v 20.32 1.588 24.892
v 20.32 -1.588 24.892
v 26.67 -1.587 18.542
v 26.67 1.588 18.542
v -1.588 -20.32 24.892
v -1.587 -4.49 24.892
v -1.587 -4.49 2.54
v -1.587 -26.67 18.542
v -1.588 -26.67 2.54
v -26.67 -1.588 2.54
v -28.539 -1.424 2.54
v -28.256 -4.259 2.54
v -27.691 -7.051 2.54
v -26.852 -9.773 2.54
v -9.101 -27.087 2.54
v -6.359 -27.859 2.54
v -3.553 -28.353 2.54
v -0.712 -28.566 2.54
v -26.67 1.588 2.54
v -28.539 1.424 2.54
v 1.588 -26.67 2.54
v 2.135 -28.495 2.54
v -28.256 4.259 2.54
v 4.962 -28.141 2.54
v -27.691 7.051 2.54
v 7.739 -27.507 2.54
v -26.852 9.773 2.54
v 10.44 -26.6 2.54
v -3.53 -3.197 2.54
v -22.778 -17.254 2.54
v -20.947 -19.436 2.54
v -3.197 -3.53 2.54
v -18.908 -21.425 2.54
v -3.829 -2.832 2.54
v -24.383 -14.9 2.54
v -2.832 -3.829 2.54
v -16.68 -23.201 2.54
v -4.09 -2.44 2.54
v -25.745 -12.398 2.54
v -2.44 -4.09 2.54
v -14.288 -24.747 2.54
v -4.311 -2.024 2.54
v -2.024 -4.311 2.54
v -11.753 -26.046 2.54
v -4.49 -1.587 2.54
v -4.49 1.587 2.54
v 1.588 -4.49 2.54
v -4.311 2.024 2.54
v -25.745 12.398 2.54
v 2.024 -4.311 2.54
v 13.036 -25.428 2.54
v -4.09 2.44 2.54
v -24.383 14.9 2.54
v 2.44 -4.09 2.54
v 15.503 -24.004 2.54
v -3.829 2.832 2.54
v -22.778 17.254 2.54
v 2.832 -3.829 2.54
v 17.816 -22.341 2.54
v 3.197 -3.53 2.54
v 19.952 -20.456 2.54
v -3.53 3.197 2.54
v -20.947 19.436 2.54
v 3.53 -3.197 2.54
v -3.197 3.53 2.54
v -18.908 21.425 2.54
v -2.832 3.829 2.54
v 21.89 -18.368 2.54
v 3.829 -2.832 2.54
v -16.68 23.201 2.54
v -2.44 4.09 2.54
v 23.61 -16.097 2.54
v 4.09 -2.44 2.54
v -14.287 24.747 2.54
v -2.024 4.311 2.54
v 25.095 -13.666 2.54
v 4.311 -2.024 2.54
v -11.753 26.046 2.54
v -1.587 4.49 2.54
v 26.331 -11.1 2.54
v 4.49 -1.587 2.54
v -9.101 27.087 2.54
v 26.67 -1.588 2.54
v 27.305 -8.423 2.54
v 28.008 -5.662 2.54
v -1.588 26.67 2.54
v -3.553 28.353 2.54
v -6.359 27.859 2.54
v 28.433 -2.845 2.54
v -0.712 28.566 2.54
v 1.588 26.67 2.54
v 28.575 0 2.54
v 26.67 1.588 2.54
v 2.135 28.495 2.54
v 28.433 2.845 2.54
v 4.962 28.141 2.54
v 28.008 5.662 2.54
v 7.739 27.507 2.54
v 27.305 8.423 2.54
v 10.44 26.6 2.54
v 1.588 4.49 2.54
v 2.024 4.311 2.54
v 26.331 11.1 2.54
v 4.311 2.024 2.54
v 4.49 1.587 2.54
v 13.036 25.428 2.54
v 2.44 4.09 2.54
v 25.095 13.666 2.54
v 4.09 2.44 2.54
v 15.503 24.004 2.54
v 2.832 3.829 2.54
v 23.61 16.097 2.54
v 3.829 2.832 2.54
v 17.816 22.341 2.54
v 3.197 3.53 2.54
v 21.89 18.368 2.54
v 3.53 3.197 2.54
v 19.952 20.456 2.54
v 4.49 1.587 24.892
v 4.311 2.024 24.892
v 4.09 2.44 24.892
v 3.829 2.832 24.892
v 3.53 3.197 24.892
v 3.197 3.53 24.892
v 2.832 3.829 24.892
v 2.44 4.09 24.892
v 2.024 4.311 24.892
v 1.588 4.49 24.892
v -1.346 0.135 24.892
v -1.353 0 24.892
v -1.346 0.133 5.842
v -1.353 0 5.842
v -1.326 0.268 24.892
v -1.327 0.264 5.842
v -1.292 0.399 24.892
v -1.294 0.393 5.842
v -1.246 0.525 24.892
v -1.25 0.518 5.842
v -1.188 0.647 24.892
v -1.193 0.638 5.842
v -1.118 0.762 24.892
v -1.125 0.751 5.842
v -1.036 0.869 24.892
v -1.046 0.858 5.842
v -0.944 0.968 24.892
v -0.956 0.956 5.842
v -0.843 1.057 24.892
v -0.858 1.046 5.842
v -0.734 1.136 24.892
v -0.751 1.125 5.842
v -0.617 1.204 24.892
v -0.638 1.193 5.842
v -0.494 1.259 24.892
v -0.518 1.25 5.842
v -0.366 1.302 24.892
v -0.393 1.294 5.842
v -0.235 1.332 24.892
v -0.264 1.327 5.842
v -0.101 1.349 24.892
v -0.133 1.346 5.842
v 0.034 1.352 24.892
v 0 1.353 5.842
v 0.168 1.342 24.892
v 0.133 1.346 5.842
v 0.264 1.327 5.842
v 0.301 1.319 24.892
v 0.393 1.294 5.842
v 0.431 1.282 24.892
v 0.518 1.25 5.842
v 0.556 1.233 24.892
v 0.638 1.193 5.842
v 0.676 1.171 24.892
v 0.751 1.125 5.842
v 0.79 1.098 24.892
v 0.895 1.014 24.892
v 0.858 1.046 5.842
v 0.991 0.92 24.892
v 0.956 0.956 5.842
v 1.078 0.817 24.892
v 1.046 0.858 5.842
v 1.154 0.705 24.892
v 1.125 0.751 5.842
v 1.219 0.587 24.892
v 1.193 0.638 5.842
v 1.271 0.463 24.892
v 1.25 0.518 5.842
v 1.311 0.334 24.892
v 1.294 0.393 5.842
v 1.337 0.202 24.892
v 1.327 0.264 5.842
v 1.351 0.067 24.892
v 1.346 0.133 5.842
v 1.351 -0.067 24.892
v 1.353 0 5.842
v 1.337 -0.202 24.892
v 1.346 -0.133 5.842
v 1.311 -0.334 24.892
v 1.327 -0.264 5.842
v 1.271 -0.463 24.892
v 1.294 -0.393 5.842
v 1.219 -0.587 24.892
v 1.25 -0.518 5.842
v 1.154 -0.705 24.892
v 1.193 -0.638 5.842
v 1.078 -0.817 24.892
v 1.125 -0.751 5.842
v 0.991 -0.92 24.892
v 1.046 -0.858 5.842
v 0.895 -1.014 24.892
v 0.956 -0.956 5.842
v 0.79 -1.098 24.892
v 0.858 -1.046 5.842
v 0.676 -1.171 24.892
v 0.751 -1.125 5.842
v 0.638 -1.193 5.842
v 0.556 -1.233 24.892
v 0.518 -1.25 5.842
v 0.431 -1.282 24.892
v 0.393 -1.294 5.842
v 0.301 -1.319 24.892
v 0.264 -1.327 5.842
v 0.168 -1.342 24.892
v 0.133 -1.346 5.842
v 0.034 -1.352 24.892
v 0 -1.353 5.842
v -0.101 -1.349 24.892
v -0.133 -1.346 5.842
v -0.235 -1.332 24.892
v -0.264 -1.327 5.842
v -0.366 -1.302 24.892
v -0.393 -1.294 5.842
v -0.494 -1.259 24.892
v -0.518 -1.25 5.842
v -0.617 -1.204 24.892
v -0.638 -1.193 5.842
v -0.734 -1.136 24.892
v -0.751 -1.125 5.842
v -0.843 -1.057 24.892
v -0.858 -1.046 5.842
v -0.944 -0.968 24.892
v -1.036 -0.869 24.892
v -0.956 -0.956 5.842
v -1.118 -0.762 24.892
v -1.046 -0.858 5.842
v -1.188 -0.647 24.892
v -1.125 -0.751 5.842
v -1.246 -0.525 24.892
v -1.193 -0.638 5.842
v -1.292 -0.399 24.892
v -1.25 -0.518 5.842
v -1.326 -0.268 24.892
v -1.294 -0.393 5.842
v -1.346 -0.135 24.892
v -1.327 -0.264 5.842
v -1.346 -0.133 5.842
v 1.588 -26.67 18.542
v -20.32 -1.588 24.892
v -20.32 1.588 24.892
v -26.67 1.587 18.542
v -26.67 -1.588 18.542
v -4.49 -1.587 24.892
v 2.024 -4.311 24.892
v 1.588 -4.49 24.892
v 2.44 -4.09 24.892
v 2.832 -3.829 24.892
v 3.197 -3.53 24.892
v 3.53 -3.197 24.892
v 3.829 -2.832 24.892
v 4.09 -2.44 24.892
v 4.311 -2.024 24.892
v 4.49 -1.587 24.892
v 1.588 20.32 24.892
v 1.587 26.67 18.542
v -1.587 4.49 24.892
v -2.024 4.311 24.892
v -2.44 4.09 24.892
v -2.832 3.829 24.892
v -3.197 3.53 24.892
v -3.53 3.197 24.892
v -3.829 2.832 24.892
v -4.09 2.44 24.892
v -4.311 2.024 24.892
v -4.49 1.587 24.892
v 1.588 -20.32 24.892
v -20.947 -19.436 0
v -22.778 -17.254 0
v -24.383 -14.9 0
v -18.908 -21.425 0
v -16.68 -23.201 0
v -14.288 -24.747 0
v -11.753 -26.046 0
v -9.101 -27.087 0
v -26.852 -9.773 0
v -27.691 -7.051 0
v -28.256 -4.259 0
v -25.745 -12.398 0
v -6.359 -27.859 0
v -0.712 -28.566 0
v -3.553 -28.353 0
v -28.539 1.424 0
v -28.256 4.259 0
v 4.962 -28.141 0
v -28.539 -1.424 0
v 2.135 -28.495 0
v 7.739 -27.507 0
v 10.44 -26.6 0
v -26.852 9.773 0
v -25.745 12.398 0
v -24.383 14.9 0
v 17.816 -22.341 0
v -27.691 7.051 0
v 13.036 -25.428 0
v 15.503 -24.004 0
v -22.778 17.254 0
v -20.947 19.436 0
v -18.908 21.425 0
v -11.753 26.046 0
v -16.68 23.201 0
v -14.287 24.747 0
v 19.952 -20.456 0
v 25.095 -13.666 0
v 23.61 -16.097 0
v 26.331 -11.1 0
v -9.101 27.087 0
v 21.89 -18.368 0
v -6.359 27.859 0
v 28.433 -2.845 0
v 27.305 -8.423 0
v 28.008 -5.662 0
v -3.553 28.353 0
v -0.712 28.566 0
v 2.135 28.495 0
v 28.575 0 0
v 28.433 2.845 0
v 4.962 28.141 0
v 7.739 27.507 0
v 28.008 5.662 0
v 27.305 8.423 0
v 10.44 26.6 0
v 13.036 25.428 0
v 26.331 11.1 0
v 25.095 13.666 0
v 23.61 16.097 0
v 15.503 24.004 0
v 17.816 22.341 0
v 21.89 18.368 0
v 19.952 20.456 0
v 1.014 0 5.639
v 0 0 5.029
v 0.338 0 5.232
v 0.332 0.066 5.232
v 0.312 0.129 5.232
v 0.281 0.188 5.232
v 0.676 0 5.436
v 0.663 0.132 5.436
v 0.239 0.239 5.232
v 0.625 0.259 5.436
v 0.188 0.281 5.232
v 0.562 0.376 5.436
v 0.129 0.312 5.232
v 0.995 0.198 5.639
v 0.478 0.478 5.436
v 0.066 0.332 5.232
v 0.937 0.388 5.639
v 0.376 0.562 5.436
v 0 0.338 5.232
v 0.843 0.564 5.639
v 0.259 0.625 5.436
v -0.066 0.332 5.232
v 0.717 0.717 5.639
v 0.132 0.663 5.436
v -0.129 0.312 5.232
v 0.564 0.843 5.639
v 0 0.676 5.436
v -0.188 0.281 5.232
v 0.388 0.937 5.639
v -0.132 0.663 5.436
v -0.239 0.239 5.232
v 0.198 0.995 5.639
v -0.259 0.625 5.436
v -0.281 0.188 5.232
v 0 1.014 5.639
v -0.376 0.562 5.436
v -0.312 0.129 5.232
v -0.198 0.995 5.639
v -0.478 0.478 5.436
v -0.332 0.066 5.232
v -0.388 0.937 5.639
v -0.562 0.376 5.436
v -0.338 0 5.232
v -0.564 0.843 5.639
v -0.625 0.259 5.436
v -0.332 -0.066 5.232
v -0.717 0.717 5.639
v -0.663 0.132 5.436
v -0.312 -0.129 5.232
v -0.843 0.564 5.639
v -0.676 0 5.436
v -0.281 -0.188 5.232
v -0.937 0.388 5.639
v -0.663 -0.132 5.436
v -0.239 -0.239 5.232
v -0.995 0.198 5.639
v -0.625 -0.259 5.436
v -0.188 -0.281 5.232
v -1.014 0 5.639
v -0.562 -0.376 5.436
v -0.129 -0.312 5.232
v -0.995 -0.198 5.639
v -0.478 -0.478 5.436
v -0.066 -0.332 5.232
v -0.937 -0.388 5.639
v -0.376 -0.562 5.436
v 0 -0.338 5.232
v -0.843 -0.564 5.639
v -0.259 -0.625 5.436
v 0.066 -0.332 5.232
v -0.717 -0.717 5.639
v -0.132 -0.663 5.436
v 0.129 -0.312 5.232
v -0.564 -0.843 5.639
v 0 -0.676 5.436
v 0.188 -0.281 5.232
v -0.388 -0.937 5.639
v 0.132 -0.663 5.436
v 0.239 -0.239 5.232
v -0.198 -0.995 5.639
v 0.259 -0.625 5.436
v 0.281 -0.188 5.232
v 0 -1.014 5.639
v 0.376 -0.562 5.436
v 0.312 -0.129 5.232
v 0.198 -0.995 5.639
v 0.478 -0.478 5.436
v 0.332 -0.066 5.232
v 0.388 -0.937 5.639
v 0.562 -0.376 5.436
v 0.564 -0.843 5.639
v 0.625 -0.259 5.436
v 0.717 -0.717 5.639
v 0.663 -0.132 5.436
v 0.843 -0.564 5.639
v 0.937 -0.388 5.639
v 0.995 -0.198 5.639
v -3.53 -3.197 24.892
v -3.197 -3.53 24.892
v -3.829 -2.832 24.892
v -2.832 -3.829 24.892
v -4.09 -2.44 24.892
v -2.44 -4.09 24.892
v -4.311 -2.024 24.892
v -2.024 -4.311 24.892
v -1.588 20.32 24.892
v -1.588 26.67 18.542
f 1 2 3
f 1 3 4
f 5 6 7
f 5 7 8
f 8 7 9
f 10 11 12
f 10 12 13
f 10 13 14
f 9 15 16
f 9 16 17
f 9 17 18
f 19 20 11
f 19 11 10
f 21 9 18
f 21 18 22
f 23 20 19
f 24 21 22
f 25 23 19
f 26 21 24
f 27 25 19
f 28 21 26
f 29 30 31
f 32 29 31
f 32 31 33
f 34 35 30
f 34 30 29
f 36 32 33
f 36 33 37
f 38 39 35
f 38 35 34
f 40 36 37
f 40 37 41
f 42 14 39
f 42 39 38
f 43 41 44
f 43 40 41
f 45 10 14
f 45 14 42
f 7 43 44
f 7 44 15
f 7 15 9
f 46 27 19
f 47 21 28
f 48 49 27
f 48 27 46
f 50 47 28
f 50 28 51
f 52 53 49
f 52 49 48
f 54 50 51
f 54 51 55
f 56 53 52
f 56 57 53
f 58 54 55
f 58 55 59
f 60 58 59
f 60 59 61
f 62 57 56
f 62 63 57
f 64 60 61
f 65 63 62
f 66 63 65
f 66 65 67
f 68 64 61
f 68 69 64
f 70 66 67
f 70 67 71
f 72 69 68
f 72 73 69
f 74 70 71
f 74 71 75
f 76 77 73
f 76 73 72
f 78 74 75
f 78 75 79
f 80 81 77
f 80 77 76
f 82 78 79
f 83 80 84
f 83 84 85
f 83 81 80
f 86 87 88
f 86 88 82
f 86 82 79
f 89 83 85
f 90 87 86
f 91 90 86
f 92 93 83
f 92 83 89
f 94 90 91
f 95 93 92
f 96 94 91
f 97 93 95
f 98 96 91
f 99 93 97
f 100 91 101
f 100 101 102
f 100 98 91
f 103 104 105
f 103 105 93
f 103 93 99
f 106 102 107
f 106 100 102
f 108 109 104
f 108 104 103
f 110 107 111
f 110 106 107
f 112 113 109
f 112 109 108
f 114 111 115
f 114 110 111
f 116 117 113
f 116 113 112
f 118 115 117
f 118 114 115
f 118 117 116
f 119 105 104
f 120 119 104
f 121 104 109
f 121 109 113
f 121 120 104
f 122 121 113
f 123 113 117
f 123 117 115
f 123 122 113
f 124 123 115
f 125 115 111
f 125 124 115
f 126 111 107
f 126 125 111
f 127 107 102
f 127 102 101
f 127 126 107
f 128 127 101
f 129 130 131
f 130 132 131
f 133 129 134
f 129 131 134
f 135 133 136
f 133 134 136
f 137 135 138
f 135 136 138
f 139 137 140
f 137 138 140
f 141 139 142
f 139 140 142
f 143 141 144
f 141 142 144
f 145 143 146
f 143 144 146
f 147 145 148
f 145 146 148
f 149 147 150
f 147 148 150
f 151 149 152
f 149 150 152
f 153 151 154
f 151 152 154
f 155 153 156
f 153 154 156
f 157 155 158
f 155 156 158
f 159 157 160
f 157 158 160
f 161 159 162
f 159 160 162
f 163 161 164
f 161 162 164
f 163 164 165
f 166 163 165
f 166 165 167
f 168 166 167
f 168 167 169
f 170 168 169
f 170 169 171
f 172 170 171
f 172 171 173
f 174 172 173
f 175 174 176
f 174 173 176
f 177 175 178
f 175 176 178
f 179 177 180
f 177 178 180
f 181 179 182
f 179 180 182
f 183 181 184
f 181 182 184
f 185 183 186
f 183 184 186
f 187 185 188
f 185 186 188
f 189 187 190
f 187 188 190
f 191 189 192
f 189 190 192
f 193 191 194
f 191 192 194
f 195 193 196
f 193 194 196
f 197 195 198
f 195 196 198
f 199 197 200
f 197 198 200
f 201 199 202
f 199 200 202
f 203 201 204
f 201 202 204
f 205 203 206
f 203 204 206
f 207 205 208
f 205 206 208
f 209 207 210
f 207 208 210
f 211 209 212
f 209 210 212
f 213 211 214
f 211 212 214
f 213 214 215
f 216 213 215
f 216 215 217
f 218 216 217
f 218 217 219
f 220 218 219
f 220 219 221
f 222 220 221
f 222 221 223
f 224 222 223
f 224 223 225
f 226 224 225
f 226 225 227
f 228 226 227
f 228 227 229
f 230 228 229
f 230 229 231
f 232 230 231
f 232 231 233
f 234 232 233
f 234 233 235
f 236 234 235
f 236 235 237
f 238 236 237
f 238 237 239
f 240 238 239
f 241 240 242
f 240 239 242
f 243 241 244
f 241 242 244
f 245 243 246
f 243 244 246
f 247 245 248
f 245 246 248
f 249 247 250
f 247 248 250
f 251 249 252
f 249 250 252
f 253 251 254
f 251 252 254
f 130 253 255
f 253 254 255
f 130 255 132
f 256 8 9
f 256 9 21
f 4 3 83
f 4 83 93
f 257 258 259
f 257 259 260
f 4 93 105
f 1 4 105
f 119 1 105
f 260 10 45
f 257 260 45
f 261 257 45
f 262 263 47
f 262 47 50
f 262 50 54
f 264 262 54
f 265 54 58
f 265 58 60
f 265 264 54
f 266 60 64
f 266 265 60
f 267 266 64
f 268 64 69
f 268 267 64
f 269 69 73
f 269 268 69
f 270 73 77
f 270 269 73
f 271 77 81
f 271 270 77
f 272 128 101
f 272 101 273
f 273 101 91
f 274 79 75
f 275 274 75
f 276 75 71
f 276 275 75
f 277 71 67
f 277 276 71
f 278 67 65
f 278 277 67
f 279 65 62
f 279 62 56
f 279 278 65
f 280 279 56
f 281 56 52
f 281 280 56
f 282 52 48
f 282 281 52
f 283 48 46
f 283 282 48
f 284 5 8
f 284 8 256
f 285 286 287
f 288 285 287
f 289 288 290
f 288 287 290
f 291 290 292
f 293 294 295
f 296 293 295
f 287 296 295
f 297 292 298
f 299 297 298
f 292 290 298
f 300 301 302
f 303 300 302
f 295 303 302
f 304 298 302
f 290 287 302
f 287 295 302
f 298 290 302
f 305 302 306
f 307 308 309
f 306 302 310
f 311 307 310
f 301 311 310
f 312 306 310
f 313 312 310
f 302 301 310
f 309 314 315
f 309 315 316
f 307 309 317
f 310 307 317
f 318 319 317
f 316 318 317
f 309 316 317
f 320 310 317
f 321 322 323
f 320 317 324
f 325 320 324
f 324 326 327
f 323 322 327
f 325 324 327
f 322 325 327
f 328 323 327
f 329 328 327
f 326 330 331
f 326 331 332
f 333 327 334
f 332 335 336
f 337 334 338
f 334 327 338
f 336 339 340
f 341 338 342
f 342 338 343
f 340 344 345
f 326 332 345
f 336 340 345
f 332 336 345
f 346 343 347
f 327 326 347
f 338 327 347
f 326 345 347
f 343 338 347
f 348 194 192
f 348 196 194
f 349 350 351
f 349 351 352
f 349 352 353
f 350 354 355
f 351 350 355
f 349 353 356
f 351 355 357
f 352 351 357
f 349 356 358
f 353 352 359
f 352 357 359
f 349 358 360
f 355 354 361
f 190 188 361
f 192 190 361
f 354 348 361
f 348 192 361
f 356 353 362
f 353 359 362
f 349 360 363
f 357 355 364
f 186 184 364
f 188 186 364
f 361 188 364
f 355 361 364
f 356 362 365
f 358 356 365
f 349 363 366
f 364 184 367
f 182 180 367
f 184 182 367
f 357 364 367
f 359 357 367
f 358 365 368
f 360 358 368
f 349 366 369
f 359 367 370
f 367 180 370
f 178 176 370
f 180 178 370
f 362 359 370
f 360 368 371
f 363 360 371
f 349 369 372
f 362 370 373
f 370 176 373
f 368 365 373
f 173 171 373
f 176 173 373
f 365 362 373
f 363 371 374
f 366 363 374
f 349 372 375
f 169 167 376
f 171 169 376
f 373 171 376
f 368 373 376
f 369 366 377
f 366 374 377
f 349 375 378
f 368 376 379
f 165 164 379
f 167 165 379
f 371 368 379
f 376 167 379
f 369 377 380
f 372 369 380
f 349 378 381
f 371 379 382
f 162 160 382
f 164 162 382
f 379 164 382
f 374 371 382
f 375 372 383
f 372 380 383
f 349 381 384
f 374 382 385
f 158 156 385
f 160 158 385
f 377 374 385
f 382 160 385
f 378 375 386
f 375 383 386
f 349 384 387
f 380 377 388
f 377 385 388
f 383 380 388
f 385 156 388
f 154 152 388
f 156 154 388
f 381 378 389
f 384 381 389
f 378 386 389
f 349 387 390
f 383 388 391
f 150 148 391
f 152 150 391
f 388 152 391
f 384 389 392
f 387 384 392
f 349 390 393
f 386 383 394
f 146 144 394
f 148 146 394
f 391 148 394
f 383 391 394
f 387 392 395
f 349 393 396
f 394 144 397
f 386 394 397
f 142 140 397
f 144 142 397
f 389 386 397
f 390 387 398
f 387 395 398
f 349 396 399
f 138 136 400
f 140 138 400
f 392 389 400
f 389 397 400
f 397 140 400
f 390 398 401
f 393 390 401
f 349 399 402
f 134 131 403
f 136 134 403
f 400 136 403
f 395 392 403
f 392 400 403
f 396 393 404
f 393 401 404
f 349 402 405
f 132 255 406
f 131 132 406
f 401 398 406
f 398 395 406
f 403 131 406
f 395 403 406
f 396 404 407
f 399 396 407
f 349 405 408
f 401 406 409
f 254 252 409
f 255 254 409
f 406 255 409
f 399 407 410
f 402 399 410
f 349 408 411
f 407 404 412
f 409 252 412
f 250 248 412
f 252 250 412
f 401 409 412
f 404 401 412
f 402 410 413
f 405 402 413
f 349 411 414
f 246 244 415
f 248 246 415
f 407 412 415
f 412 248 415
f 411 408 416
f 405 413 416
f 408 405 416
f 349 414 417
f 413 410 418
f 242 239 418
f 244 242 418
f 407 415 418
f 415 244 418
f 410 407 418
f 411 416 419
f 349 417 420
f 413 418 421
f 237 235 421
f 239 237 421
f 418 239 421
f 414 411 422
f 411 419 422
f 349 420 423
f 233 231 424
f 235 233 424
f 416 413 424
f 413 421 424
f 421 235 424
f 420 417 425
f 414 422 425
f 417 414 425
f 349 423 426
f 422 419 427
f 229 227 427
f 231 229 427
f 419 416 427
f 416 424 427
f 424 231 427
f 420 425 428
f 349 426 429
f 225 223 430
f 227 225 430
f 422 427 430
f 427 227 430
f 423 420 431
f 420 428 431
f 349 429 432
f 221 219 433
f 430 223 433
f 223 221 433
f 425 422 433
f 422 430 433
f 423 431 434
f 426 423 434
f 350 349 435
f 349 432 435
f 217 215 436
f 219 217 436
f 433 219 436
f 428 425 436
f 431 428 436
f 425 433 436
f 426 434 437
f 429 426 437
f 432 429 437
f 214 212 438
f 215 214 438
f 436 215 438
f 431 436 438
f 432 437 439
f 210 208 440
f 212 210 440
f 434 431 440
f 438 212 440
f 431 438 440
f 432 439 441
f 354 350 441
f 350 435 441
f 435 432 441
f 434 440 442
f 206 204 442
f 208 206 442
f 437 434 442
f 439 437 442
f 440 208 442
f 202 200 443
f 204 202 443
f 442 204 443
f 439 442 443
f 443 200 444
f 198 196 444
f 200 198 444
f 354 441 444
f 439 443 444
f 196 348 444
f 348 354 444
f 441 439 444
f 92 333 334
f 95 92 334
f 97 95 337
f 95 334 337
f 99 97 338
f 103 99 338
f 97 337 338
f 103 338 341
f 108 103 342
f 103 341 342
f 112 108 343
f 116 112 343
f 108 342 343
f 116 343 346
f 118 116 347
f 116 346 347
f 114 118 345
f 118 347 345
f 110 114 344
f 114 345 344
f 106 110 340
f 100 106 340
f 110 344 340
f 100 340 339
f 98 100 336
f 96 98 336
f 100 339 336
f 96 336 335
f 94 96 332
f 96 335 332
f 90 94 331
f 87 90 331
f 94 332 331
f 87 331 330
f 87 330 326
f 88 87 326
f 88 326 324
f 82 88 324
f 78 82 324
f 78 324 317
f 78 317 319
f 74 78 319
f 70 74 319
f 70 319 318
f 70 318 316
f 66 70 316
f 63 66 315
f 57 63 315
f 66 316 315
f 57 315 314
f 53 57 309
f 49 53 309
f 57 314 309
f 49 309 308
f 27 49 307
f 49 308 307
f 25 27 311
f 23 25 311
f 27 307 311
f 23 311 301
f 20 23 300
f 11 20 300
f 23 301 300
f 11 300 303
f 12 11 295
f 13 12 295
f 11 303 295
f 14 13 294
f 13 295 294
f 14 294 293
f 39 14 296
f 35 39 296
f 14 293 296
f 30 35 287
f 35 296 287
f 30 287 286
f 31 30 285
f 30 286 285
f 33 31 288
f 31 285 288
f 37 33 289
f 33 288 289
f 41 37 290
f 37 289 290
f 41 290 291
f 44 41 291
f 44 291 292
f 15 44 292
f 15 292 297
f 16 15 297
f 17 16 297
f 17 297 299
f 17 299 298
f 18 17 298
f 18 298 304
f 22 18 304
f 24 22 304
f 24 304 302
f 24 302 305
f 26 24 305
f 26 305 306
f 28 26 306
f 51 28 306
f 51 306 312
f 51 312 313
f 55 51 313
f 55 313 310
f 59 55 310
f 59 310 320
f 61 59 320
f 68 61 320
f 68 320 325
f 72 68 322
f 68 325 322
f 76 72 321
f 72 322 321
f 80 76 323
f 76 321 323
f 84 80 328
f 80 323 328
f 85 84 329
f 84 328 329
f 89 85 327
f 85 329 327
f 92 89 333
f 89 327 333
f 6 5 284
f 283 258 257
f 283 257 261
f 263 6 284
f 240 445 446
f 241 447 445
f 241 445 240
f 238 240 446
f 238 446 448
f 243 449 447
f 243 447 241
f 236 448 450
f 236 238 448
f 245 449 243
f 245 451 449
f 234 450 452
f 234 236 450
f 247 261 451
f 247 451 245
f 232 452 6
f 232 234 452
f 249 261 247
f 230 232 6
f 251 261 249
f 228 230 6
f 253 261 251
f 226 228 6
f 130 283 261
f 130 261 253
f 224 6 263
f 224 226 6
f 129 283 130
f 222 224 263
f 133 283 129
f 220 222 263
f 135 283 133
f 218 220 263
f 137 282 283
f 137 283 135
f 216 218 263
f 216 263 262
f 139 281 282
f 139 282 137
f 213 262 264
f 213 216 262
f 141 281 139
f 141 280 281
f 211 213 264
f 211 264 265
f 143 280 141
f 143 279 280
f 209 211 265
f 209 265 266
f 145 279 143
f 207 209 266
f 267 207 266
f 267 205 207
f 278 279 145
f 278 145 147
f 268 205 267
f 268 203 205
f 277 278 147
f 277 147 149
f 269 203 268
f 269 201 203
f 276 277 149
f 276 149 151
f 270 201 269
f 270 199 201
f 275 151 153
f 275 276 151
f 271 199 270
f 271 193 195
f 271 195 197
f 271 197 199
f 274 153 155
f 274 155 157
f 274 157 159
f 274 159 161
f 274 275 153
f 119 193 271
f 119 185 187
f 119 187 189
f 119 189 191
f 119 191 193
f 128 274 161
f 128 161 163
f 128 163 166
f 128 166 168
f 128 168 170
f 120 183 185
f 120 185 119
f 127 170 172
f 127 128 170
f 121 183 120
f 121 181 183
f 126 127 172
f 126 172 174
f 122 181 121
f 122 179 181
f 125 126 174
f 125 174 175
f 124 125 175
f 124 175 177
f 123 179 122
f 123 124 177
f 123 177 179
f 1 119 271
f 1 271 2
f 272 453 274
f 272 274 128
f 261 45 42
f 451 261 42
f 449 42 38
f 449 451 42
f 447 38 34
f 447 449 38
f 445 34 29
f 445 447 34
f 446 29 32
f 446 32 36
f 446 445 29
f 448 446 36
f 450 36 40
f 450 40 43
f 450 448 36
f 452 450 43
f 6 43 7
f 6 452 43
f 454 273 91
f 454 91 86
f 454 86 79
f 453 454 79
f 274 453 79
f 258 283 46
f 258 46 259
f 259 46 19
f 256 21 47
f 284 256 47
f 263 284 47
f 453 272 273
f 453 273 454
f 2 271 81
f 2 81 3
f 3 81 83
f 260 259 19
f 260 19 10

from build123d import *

# Parameters (mm, degrees)
F0_R     = 28.575
F1_DEPTH = 2.54
F3_DEPTH = 22.352
F4_SIZE  = 6.35
F5_R     = 4.7625
F6_DEPTH = 22.352
F8_D     = 2.7051
F8_DEPTH = 19.05
F8_TIP   = 0.8126940303


with BuildPart() as f1:
    # F0 (on Top) → F1 (new body)
    with BuildSketch(Plane.XY):
        Circle(F0_R)
    extrude(amount=F1_DEPTH)

    # F2 (on face) → F3 (join)
    with BuildSketch(Plane.XY.offset(2.54)):
        Polygon((26.67, -1.5875), (26.67, 1.5875), (1.5875, 1.5875), (1.5875, 26.67), (-1.5875, 26.67), (-1.5875, 1.5875), (-26.67, 1.5875), (-26.67, -1.5875), (-1.5875, -1.5875), (-1.5875, -26.67), (1.5875, -26.67), (1.5875, -1.5875), align=None)
    extrude(amount=F3_DEPTH)

    # F4
    f4_edges = [f1.edges().sort_by_distance(p)[0] for p in [
        (0, -26.67, 24.892),
        (26.67, 0, 24.892),
        (0, 26.67, 24.892),
        (-26.67, 0, 24.892),
    ]]
    chamfer(f4_edges, length=F4_SIZE)

    # F5 (on face) → F6 (join, through all)
    with BuildSketch(Plane.XY.offset(24.892)):
        Circle(F5_R)
    extrude(amount=-F6_DEPTH)

    # F8
    with Locations(Plane.XY.offset(24.892)):
        with Locations((0, 0)):
            Hole(F8_D / 2, depth=F8_DEPTH)
            with Locations((0, 0, -(F8_DEPTH + F8_TIP / 2))):  # 118° drill point
                Cone(0, F8_D / 2, F8_TIP, mode=Mode.SUBTRACT)


solid = f1.part
